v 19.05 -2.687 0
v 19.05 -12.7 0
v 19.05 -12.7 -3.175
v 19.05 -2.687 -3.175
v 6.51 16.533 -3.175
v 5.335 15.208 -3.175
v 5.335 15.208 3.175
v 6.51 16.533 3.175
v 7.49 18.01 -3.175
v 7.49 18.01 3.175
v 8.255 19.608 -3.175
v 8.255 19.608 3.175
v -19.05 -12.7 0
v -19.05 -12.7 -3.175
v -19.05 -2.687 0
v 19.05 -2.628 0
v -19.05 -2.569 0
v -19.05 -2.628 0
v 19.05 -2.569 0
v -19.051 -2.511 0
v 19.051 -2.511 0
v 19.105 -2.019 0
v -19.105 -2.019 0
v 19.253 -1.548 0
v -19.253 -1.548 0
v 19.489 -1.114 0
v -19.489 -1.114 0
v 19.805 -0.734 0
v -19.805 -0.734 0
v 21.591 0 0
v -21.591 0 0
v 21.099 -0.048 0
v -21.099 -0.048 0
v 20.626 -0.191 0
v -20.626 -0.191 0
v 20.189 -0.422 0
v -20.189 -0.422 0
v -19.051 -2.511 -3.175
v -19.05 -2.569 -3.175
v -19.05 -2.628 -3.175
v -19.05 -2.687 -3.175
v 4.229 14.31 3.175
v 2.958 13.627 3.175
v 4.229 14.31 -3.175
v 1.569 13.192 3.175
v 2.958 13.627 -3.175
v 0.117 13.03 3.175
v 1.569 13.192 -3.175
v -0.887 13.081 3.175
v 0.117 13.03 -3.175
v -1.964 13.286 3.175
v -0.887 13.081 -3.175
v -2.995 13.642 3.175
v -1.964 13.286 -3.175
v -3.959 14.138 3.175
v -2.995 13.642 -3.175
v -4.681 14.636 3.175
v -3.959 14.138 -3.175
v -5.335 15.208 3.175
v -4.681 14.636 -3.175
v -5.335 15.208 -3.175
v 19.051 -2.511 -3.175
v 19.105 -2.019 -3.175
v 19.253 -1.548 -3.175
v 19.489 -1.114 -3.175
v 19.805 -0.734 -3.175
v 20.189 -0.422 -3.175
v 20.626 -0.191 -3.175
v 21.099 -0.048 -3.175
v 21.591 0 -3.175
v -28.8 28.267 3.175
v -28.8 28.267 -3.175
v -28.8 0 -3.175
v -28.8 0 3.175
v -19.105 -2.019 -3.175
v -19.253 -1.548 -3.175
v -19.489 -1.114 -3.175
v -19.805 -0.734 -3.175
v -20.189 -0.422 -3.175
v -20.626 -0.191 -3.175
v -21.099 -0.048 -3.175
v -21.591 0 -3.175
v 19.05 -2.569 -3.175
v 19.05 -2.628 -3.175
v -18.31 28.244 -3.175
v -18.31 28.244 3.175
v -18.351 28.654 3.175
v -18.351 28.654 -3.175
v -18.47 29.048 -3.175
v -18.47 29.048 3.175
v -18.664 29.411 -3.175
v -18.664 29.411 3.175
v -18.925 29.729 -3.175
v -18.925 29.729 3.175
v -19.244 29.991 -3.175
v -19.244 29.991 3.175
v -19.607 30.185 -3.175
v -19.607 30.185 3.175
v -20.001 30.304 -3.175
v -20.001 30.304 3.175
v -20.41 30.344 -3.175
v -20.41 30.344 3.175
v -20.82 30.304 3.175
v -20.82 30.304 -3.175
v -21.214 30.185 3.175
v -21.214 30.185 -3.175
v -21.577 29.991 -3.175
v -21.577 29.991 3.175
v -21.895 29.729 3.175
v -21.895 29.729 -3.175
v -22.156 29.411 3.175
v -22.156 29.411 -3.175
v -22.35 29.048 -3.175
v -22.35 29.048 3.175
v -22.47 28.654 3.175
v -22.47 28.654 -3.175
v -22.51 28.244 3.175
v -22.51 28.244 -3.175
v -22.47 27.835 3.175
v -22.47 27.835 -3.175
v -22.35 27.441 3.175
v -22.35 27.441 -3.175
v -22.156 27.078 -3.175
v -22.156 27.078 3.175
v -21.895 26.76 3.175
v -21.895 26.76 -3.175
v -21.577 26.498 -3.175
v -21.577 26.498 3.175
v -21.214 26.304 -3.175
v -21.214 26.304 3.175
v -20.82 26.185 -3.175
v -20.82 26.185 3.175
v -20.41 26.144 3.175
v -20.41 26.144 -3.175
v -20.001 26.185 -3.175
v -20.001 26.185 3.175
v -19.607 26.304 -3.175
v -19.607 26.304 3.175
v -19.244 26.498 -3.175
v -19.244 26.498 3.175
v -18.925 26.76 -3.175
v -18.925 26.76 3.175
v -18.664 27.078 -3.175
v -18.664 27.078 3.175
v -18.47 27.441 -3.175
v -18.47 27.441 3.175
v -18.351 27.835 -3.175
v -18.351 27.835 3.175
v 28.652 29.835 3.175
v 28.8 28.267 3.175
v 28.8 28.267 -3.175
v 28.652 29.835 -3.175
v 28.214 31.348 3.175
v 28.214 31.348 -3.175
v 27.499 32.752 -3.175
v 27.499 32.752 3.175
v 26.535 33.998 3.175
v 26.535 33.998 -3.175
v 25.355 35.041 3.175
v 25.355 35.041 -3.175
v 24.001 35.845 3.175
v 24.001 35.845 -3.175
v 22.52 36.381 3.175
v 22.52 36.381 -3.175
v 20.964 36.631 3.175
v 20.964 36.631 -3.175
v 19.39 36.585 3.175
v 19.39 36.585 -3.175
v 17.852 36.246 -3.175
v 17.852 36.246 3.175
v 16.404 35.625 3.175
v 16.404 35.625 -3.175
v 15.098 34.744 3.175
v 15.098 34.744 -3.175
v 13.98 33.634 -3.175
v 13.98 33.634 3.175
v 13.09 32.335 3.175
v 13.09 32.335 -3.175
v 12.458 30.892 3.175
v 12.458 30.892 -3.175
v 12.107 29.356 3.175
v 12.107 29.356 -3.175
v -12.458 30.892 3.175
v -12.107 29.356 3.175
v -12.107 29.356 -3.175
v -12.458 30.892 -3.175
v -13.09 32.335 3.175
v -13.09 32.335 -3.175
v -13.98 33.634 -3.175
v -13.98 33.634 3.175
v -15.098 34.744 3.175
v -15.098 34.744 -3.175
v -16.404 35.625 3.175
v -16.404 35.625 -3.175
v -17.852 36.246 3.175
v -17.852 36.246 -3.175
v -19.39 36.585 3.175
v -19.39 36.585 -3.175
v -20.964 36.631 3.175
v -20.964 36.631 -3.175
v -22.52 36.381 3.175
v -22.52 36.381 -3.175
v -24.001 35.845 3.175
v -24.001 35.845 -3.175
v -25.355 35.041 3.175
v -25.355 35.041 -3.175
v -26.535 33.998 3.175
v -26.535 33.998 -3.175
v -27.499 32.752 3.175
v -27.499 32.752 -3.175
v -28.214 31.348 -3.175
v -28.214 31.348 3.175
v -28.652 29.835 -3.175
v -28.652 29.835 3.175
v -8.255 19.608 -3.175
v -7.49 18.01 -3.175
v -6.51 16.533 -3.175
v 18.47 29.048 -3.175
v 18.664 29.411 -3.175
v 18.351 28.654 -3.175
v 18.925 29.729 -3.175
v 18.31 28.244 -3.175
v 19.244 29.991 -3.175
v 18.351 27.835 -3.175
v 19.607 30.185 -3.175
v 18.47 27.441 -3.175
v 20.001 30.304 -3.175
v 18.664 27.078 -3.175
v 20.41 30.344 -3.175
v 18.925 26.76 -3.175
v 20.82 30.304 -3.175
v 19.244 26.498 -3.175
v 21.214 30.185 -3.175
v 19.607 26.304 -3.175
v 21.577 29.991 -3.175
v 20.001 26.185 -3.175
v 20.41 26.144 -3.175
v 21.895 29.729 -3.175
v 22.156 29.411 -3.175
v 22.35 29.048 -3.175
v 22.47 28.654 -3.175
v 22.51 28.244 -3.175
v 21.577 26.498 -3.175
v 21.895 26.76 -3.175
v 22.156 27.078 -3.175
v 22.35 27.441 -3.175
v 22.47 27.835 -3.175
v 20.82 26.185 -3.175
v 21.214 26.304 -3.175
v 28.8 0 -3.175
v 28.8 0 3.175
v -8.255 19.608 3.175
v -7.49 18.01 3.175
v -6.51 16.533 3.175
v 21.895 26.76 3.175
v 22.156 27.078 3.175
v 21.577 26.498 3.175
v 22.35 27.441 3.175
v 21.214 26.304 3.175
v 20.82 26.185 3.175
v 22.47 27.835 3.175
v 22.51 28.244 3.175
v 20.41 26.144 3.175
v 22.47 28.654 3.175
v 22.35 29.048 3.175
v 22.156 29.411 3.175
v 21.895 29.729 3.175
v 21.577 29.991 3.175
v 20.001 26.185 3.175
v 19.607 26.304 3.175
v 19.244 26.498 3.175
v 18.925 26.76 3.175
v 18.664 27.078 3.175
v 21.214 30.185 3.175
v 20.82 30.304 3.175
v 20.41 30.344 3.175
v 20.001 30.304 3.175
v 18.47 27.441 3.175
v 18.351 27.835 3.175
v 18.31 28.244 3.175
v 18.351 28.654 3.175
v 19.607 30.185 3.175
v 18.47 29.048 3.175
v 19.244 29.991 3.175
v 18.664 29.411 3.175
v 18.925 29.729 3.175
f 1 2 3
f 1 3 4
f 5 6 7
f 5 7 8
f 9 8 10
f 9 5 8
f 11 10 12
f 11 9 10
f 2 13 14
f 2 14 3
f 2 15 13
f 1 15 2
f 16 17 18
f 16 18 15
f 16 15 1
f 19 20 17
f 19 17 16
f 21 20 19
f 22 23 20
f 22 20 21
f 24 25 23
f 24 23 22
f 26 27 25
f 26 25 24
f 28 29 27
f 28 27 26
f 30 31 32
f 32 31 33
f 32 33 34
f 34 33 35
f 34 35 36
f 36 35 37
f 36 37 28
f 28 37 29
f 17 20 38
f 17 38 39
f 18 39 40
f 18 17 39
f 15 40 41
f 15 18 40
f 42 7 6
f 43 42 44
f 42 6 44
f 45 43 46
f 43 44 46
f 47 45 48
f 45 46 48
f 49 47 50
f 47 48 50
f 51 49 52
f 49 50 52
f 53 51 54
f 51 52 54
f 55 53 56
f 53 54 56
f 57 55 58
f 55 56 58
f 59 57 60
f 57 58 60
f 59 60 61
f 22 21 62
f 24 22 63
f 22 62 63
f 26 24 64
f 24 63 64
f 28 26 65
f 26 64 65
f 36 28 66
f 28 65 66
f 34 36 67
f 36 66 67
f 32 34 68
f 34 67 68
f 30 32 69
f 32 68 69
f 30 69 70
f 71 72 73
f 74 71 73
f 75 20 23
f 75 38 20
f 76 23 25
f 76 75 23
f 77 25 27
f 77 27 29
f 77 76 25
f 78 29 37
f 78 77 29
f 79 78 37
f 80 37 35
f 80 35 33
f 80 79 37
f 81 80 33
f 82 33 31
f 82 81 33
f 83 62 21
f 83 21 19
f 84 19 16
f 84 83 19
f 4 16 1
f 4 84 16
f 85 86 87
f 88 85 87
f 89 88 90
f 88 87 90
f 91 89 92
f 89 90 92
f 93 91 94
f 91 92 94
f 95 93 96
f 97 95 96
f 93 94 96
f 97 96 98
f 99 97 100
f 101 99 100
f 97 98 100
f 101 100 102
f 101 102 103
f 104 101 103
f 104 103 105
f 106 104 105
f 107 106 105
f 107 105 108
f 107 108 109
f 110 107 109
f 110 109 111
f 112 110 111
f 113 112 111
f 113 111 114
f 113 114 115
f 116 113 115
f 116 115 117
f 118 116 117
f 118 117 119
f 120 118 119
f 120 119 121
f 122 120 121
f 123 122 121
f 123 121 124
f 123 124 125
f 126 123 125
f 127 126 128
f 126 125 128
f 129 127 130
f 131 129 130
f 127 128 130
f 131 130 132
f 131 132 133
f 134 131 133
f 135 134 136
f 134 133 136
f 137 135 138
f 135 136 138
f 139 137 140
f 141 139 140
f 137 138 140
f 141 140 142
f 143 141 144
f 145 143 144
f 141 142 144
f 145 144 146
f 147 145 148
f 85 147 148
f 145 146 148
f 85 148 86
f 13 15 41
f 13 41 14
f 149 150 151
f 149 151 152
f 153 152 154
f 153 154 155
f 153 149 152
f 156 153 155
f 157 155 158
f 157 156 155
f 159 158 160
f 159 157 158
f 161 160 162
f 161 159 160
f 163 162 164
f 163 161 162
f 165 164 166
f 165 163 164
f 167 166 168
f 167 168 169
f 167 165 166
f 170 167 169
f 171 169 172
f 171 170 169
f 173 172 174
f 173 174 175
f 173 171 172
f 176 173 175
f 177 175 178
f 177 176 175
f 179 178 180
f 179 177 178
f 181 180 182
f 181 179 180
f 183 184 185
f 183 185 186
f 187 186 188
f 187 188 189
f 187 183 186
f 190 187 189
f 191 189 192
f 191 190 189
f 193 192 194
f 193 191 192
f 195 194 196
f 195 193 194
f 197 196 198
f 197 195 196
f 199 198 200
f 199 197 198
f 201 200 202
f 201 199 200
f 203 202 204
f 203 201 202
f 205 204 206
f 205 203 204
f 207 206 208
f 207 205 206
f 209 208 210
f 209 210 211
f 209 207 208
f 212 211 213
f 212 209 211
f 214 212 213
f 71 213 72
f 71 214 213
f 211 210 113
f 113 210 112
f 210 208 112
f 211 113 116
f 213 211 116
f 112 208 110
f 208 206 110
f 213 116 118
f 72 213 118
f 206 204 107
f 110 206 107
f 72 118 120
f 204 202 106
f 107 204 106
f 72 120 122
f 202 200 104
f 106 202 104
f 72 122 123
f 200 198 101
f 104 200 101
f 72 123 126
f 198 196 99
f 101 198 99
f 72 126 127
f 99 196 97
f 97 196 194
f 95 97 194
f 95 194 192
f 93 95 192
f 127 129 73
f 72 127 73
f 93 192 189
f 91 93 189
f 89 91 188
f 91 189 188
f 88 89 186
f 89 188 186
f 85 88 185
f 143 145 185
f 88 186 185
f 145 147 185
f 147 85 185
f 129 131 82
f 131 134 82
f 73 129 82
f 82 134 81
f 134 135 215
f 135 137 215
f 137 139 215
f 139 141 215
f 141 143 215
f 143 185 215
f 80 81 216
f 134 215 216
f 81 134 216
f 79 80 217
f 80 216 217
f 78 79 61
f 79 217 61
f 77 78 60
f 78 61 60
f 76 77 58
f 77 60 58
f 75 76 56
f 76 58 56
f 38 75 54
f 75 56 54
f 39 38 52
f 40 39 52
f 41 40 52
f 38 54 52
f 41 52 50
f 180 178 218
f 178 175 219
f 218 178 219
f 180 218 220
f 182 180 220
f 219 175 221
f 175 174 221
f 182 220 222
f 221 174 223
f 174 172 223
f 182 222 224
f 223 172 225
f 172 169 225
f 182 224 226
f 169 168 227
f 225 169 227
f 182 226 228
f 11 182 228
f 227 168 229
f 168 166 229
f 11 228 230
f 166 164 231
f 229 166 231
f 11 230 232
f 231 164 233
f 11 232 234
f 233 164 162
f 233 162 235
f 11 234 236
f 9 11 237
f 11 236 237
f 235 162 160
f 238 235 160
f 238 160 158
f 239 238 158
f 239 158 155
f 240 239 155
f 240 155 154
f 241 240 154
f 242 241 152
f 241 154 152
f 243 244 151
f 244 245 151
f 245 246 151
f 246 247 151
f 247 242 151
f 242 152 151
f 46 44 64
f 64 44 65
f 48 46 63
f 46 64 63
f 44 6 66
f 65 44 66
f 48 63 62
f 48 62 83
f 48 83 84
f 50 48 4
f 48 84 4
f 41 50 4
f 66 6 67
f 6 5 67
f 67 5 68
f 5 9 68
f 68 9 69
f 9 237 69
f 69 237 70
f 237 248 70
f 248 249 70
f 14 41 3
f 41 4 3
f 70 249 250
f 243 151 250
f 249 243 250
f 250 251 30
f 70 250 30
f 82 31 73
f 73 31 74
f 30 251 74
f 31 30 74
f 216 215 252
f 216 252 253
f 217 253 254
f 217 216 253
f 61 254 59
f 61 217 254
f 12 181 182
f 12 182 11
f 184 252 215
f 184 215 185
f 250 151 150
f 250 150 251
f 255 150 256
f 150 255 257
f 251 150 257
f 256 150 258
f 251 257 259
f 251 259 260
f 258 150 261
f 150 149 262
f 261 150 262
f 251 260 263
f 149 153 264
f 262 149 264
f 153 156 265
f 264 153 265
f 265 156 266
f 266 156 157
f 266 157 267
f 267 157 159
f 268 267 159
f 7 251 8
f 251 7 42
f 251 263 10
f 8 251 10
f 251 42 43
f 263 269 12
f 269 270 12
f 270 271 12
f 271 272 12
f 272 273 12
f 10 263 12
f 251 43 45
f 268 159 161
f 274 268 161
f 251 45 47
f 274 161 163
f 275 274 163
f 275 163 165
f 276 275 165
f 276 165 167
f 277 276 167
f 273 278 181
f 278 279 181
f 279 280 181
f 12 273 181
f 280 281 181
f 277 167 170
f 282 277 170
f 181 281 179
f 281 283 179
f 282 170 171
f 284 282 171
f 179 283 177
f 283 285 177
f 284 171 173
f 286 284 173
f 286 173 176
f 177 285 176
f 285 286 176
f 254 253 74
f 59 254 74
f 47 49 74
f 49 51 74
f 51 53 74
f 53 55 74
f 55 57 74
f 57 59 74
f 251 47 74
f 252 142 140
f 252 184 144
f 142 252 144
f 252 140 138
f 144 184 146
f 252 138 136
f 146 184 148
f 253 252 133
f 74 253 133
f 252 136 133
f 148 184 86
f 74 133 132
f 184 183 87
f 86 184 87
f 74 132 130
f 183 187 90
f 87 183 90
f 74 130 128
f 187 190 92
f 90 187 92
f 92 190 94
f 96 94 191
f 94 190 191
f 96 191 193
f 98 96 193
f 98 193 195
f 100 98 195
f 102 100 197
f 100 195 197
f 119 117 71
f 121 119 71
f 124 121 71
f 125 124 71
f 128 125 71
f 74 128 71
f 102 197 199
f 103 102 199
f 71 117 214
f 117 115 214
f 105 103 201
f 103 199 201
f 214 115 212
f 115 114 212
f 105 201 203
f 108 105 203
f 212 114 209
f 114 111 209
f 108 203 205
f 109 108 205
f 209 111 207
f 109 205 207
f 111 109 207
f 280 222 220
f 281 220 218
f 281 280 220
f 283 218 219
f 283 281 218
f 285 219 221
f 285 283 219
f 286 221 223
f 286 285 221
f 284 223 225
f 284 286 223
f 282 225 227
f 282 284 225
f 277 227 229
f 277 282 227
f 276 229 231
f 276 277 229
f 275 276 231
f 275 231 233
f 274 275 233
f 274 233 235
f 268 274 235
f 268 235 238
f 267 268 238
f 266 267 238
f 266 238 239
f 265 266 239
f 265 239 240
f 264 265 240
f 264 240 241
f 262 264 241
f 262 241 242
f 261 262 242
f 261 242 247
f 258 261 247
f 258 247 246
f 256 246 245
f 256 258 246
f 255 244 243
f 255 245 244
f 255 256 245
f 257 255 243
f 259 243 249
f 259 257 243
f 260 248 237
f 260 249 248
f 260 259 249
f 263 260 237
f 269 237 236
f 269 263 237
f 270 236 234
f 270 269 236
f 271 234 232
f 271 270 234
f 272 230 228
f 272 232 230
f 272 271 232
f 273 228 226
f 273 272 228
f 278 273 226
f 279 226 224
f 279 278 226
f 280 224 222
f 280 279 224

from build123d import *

# Parameters (mm, degrees)
BOSS_EXTRU_1_DEPTH             = 3.175
ESQUISSE3_R                    = 2.1
ENL_V_MAT_EXTRU_1_DEPTH        = 48.041658028
ESQUISSE4_W                    = 38.1
ESQUISSE4_H                    = 12.7
ENL_V_MAT_EXTRU_2_DEPTH        = 3.175
CONG_1_R                       = 12.7
CONG_4_R                       = 7.62
CONG_5_R                       = 15.24
BOSS_EXTRU_4_REACH             = 48.719
BOSS_EXTRU_4_DIRECTION_2_REACH = 48.719
CONG_6_R                       = 2.54
BOSS_EXTRU_5_REACH             = 49.042


with BuildPart() as part:
    # Esquisse2 → Boss.-Extru.1 (new, symmetric)
    with BuildSketch(Plane.XY):
        with BuildLine():
            Line((19.05, 0), (28.29484395, 25.4))
            ThreePointArc((28.29484395, 25.4), (22.40844386, 36.409135129), (12.107464983, 29.356433767))
            Line((12.107464983, 29.356433767), (5.08, 11.576433767))
            Line((5.08, 11.576433767), (-5.08, 11.576433767))
            Line((-5.08, 11.576433767), (-12.107464983, 29.356433767))
            ThreePointArc((-12.107464983, 29.356433767), (-22.40844386, 36.409135129), (-28.29484395, 25.4))
            Line((-28.29484395, 25.4), (-19.05, 0))
            Line((-19.05, 0), (-19.05, -12.7))
            Line((-19.05, -12.7), (19.05, -12.7))
            Line((19.05, -12.7), (19.05, 0))
        make_face()
    extrude(amount=BOSS_EXTRU_1_DEPTH, both=True)

    # Esquisse3 → Enlèv. mat.-Extru.1 (cut, through all)
    with BuildSketch(Plane.XY.offset(3.175)):
        with Locations((-20.410216204, 28.244491788)):
            Circle(ESQUISSE3_R)
    enl_v_mat_extru_1 = extrude(amount=-ENL_V_MAT_EXTRU_1_DEPTH, mode=Mode.SUBTRACT)

    # Symétrie1: Enlèv. mat.-Extru.1 across plane
    add(enl_v_mat_extru_1.mirror(Plane(origin=(0, 0, 0), x_dir=(0, 0, 1), z_dir=(1, 0, 0))), mode=Mode.SUBTRACT)

    # Esquisse4 → Enlèv. mat.-Extru.2 (cut)
    with BuildSketch(Plane.XY.offset(3.175)):
        with Locations((0, -6.35)):
            Rectangle(ESQUISSE4_W, ESQUISSE4_H)
    extrude(amount=-ENL_V_MAT_EXTRU_2_DEPTH, mode=Mode.SUBTRACT)

    # Congé1
    # the kernel refuses this fillet: 12.7 mm, written as the material it adds along each edge
    with BuildSketch(Plane(origin=(5.08, 11.576433767, -3.175), x_dir=(0.3675757751944704, 0.9299935749725285, 0), z_dir=(0, 0, 1)), Plane(origin=(-5.08, 11.576433767, -3.175), x_dir=(1, 0, 0), z_dir=(0, 0, 1))) as cong_1_piece_1:
        with BuildLine():
            CenterArc((CONG_1_R * 0.68003074626, CONG_1_R), CONG_1_R, 201.566186537, 68.433813463)
            Line((-CONG_1_R * 0.249962828713, CONG_1_R * 0.632424224806), (0, 0))
            Line((0, 0), (CONG_1_R * 0.68003074626, 0))
        make_face()
    extrude(amount=6.35)

    # Congé4
    cong_4_edges = [part.edges().sort_by_distance(p)[0] for p in [
        (0, 12.084547663, 0),
    ]]
    fillet(cong_4_edges, radius=CONG_4_R)

    # Congé5
    cong_5_edges = [part.edges().sort_by_distance(p)[0] for p in [
        (-19.05, 0, -1.5875),
        (19.05, 0, -1.5875),
    ]]
    fillet(cong_5_edges, radius=CONG_5_R)

    # Boss.-Extru.4: up to this face of the body (flat: up to its plane)
    boss_extru_4_end = Plane(part.part.faces().sort_by_distance((9.3e-08, 10.23403755, -3.175))[0])
    # Esquisse6 → Boss.-Extru.4 (add, up to the picked face)
    with BuildSketch(Plane.XY, mode=Mode.PRIVATE) as boss_extru_4_sk1:
        with BuildLine():
            Line((28.800340403, 28.266812841), (28.800340403, 0))
            Line((28.800340403, 0), (19.288785664, 0))
            ThreePointArc((19.288785664, 0), (19.57466996, 1.27720134), (19.969084459, 2.525163798))
            Line((19.969084459, 2.525163798), (28.29484395, 25.4))
            ThreePointArc((28.29484395, 25.4), (28.672998989, 26.811293816), (28.800340403, 28.266812841))
        make_face()
    boss_extru_4_tool1 = split(extrude(boss_extru_4_sk1.sketch, amount=-BOSS_EXTRU_4_REACH, mode=Mode.PRIVATE), bisect_by=boss_extru_4_end, keep=Keep.BOTH, mode=Mode.PRIVATE)
    boss_extru_4 = boss_extru_4_tool1.solids().sort_by(Axis((25.562927, 8.959806, 0), (0, 0, -1)))[0]
    add(boss_extru_4)

    # Boss.-Extru.4 direction 2: up to this face of the body (flat: up to its plane)
    boss_extru_4_direction_2_end = Plane(part.part.faces().sort_by_distance((7.594682873, 16.877070462, 3.175))[0])
    # Esquisse6 → Boss.-Extru.4 direction 2 (add, up to the picked face)
    with BuildSketch(Plane.XY, mode=Mode.PRIVATE) as boss_extru_4_direction_2_sk1:
        with BuildLine():
            Line((28.800340403, 28.266812841), (28.800340403, 0))
            Line((28.800340403, 0), (19.288785664, 0))
            ThreePointArc((19.288785664, 0), (19.57466996, 1.27720134), (19.969084459, 2.525163798))
            Line((19.969084459, 2.525163798), (28.29484395, 25.4))
            ThreePointArc((28.29484395, 25.4), (28.672998989, 26.811293816), (28.800340403, 28.266812841))
        make_face()
    boss_extru_4_direction_2_tool1 = split(extrude(boss_extru_4_direction_2_sk1.sketch, amount=BOSS_EXTRU_4_DIRECTION_2_REACH, mode=Mode.PRIVATE), bisect_by=boss_extru_4_direction_2_end, keep=Keep.BOTH, mode=Mode.PRIVATE)
    boss_extru_4_direction_2 = boss_extru_4_direction_2_tool1.solids().sort_by(Axis((25.562927, 8.959806, 0), (0, 0, 1)))[0]
    add(boss_extru_4_direction_2)

    # Symétrie3: Boss.-Extru.4, Boss.-Extru.4 direction 2 across plane
    add(boss_extru_4.mirror(Plane(origin=(0, 0, 0), x_dir=(0, 0, 1), z_dir=(1, 0, 0))))
    add(boss_extru_4_direction_2.mirror(Plane(origin=(0, 0, 0), x_dir=(0, 0, 1), z_dir=(1, 0, 0))))

    # Congé6
    cong_6_edges = [part.edges().sort_by_distance(p)[0] for p in [
        (-19.288785664, 0, -1.5875),
        (19.288785664, 0, -1.5875),
    ]]
    fillet(cong_6_edges, radius=CONG_6_R)

    # Esquisse7 → Boss.-Extru.5 (add, up to next)
    with BuildSketch(Plane.XY.offset(3.175), mode=Mode.PRIVATE) as boss_extru_5_sk1:
        with BuildLine():
            Line((-19.288785664, 0), (-19.05, 0))
            Line((-19.05, 0), (-19.969084459, 2.525163798))
            ThreePointArc((-19.969084459, 2.525163798), (-19.57466996, 1.27720134), (-19.288785664, 0))
        make_face()
    boss_extru_5_tool1 = extrude(boss_extru_5_sk1.sketch, amount=-BOSS_EXTRU_5_REACH, mode=Mode.PRIVATE) - part.part
    boss_extru_5 = boss_extru_5_tool1.solids().sort_by_distance((-19.353449, 0.636158, 3.175))[0]
    add(boss_extru_5)

    # Symétrie4: Boss.-Extru.5 across plane
    add(boss_extru_5.mirror(Plane(origin=(0, 0, 0), x_dir=(0, 0, 1), z_dir=(1, 0, 0))))


solid = part.part
